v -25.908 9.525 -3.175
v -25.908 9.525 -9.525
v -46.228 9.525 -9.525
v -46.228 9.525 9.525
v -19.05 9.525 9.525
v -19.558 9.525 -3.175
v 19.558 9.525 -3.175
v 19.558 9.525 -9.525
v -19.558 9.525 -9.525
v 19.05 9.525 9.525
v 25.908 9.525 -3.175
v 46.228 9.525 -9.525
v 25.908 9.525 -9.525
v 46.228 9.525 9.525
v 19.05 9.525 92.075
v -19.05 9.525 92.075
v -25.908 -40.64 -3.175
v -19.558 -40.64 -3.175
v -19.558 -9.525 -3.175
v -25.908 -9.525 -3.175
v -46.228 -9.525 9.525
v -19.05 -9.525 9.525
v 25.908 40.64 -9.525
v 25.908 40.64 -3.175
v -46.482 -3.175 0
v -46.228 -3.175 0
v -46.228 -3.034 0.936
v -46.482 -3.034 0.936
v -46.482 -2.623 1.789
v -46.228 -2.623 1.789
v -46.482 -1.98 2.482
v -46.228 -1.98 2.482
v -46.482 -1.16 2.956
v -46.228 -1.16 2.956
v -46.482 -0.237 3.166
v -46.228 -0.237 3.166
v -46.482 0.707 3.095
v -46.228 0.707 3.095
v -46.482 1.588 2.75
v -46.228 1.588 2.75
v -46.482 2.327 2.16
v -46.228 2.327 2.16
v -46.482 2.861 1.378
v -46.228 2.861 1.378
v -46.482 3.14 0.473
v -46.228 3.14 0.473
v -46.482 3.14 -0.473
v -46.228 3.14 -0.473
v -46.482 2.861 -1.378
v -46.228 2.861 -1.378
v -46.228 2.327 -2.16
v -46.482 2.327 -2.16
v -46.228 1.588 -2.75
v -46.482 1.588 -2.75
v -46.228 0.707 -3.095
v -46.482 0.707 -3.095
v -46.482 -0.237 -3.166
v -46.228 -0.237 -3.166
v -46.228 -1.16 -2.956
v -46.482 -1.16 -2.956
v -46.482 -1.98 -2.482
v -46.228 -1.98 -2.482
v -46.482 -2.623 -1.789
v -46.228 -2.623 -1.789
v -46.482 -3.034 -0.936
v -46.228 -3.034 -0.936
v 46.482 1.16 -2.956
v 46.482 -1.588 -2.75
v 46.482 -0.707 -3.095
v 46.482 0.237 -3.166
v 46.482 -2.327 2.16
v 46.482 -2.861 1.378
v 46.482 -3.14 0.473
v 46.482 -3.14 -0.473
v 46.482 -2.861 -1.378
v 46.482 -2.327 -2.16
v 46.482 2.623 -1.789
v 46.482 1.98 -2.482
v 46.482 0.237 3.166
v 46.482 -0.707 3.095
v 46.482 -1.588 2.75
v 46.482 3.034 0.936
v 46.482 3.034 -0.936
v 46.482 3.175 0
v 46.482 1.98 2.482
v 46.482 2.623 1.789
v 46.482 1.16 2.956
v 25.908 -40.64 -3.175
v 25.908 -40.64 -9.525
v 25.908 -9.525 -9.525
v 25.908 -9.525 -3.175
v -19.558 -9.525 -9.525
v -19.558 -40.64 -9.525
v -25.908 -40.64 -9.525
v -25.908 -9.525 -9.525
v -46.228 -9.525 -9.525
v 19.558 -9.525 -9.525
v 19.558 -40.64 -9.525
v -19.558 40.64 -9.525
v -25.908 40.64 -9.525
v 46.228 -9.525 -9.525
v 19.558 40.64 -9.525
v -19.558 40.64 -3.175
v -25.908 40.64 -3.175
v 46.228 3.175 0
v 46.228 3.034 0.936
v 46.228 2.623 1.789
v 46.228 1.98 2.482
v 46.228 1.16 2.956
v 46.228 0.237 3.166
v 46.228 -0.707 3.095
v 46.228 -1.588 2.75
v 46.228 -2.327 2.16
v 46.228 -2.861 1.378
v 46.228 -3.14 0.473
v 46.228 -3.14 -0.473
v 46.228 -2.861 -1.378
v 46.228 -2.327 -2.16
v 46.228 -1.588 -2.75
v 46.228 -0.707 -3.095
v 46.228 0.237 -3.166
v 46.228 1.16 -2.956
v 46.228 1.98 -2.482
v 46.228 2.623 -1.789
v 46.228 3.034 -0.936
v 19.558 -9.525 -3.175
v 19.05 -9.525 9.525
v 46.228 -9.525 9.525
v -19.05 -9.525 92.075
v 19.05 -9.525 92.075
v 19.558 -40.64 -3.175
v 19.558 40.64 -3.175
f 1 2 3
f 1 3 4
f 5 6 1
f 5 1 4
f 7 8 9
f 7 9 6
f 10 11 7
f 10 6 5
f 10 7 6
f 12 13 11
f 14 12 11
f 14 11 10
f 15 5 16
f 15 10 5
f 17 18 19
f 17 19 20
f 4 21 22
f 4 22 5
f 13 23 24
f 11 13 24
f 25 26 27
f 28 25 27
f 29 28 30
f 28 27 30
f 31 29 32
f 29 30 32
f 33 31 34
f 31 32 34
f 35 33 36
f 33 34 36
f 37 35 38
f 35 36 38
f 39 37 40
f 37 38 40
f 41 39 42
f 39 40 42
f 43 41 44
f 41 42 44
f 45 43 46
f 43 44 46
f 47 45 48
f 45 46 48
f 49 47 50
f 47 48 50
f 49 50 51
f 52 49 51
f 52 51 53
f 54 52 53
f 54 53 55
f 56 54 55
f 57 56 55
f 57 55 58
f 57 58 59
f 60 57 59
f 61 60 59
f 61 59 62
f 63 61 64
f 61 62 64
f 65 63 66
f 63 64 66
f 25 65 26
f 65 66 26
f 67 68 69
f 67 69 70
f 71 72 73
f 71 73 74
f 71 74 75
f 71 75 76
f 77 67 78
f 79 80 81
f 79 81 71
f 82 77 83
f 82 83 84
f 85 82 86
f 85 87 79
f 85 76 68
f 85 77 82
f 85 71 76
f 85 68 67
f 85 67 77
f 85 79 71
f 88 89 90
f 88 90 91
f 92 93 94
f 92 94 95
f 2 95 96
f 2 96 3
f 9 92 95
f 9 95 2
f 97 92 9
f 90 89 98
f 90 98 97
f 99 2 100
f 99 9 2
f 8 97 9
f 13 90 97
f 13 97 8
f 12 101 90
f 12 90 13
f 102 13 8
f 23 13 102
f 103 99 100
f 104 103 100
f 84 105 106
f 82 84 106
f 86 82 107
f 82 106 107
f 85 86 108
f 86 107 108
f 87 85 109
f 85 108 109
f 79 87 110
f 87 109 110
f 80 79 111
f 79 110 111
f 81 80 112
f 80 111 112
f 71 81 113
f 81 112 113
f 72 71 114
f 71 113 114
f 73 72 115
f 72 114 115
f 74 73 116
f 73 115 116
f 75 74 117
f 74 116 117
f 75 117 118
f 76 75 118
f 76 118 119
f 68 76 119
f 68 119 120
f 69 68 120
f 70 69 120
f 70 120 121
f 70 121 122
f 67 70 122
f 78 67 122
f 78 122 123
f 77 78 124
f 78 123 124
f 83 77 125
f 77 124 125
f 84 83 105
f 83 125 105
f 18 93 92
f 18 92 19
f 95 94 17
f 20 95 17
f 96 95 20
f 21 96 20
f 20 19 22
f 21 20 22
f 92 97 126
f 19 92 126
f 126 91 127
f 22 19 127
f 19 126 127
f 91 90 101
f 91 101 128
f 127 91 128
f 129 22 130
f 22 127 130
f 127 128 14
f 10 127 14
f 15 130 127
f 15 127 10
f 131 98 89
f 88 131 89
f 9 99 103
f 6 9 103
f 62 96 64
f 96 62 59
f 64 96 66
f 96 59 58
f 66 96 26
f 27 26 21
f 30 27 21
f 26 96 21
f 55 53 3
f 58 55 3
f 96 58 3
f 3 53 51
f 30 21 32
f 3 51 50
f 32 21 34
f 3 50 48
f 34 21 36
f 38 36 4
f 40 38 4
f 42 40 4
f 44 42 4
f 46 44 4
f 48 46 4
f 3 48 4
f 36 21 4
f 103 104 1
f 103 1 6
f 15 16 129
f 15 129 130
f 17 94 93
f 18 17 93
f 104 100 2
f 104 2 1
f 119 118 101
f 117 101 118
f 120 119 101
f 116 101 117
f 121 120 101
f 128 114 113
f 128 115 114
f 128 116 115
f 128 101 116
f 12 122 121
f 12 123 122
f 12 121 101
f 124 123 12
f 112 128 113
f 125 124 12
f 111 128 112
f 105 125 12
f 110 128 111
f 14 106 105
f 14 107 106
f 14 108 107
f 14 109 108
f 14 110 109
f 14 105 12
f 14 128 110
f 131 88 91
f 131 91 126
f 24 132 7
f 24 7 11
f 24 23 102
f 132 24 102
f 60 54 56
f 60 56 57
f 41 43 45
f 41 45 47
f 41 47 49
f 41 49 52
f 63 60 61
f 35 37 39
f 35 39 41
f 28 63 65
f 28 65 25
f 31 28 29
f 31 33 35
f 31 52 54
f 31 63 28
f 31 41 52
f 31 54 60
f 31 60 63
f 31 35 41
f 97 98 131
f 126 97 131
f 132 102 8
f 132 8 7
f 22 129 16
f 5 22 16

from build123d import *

# Parameters (mm, degrees)
F0_W      = 19.05
F0_H      = 19.05
F1_DEPTH  = 46.228
F2_W      = 3.175
F2_H      = 6.35
F3_DEPTH  = 31.115
F4_W      = 3.175
F4_H      = 6.35
F5_DEPTH  = 31.115
F6_W      = 19.05
F6_H      = 19.05
F7_DEPTH  = 82.55
F8_R      = 3.175
F9_DEPTH  = 0.254
F10_R     = 3.175
F11_DEPTH = 0.254


with BuildPart() as f1:
    # F0 (on Right) → F1 (new body, symmetric)
    with BuildSketch(Plane.YZ):
        Rectangle(F0_W, F0_H)
    extrude(amount=F1_DEPTH, both=True)

    # F2 (on face) → F3 (join)
    with BuildSketch(Plane(origin=(0, 9.525, 0), x_dir=(-1, 0, 0), z_dir=(0, 1, 0))):
        with Locations((-21.1455, -6.35)):
            Rectangle(F2_W, F2_H)
        with Locations((-24.3205, -6.35)):
            Rectangle(F2_W, F2_H)
        with Locations((24.3205, -6.35)):
            Rectangle(F2_W, F2_H)
        with Locations((21.1455, -6.35)):
            Rectangle(F2_W, F2_H)
    extrude(amount=F3_DEPTH)

    # F4 (on face) → F5 (join)
    with BuildSketch(Plane.XZ.offset(9.525)):
        with Locations((-21.1455, -6.35)):
            Rectangle(F4_W, F4_H)
        with Locations((-24.3205, -6.35)):
            Rectangle(F4_W, F4_H)
        with Locations((24.3205, -6.35)):
            Rectangle(F4_W, F4_H)
        with Locations((21.1455, -6.35)):
            Rectangle(F4_W, F4_H)
    extrude(amount=F5_DEPTH)

    # F6 (on face) → F7 (join)
    with BuildSketch(Plane.XY.offset(9.525)):
        with Locations((9.525, 0)):
            Rectangle(F6_W, F6_H)
        with Locations((-9.525, 0)):
            Rectangle(F6_W, F6_H)
    extrude(amount=F7_DEPTH)

    # F8 (on face) → F9 (join)
    with BuildSketch(Plane(origin=(-46.228, 0, 0), x_dir=(0, -1, 0), z_dir=(-1, 0, 0))):
        Circle(F8_R)
    extrude(amount=F9_DEPTH)

    # F10 (on face) → F11 (join)
    with BuildSketch(Plane.YZ.offset(46.228)):
        Circle(F10_R)
    extrude(amount=F11_DEPTH)


solid = f1.part
